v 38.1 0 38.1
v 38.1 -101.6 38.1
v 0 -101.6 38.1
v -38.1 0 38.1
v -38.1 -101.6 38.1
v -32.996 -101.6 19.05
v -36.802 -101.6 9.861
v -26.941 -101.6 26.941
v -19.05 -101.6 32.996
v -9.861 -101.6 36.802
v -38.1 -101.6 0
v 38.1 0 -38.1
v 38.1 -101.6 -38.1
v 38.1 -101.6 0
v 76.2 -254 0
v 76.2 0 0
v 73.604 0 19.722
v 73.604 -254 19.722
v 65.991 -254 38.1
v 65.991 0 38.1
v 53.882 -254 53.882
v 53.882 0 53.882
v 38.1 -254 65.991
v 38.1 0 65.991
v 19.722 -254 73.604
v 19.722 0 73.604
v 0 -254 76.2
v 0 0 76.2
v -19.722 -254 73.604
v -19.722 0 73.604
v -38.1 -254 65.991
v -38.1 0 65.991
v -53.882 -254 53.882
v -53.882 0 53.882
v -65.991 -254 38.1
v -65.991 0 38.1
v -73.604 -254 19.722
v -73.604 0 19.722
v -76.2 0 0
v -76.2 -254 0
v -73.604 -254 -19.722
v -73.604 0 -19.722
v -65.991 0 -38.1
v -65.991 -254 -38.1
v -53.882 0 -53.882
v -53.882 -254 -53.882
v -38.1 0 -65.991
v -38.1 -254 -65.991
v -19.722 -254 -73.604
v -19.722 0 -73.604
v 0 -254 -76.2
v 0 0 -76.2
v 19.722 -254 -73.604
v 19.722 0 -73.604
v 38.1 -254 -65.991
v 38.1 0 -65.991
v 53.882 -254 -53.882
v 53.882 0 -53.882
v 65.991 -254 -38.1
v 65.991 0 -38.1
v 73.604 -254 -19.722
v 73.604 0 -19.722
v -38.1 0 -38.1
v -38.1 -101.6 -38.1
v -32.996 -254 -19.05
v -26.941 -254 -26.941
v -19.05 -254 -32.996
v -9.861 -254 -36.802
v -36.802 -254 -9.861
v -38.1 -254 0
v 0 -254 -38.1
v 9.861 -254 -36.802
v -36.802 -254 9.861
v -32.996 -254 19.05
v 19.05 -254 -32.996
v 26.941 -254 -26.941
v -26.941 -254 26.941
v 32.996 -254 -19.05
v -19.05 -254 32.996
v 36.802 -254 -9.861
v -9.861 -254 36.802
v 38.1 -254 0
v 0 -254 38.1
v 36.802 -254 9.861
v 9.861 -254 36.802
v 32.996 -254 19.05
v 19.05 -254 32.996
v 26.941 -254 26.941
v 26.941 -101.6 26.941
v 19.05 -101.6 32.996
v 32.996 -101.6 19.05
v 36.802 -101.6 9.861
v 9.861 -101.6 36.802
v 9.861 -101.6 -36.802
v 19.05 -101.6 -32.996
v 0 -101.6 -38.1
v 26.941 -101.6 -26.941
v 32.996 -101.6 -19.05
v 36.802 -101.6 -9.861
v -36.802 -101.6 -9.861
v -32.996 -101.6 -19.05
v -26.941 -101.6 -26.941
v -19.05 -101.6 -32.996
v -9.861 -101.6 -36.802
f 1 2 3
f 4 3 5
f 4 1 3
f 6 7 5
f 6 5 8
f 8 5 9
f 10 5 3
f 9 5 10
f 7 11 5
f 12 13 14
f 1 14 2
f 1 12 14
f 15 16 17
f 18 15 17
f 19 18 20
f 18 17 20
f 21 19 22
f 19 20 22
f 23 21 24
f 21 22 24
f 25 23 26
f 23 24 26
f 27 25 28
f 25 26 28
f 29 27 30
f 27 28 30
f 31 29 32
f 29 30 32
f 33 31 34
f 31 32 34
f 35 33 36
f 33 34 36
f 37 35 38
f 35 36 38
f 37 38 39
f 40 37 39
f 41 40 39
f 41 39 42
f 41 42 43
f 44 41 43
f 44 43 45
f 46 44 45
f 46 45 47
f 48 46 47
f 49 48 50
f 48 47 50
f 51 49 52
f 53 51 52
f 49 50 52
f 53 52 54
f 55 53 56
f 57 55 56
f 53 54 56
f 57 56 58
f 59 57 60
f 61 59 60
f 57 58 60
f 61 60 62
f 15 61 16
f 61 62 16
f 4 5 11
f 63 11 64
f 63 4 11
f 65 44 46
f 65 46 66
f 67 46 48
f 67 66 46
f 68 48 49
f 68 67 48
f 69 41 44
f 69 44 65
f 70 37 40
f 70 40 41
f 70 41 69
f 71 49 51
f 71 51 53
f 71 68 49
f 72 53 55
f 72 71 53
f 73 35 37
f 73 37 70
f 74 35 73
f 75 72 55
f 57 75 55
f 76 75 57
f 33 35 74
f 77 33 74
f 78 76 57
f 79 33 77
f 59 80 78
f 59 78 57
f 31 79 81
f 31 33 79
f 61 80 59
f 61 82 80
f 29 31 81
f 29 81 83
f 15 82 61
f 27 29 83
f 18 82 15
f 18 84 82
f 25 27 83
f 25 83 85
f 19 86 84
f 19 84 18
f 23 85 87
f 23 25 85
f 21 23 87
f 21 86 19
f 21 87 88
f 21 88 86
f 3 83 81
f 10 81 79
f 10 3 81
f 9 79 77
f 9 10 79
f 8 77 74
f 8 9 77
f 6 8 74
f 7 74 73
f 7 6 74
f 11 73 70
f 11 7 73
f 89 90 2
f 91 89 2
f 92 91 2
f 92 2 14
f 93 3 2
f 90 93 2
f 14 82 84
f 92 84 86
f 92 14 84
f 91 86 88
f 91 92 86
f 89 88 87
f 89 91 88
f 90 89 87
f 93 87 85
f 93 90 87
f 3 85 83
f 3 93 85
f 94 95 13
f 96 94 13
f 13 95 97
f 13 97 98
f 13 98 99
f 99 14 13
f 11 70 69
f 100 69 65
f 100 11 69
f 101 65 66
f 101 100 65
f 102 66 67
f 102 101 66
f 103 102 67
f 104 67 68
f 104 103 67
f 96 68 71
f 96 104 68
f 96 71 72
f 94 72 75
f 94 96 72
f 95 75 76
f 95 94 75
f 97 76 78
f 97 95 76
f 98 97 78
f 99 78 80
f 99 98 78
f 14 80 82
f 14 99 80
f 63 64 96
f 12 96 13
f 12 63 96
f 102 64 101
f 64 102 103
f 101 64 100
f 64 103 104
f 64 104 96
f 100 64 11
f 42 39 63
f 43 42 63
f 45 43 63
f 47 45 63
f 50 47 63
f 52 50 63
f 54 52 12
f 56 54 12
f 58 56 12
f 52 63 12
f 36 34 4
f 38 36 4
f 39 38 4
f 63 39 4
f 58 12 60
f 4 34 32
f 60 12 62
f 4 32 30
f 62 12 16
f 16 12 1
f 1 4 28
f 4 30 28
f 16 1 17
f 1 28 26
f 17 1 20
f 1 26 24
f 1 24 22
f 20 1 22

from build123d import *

# Parameters (mm, degrees)
F0_R     = 76.2
F2_DEPTH = 254
F3_DEPTH = 254.001
F4_DEPTH = 101.6


with BuildPart() as f2:
    # F0 (on Front) → F2 (new body)
    with BuildSketch(Plane.XZ):
        Circle(F0_R)
    extrude(amount=F2_DEPTH)

    # F1 (on Front) → F3 (cut, through all)
    with BuildSketch(Plane.XZ):
        with BuildLine():
            ThreePointArc((38.1, 0), (26.940768, 26.940768), (0, 38.1))
            ThreePointArc((0, 38.1), (-26.940768, 26.940768), (-38.1, 0))
            ThreePointArc((-38.1, 0), (-26.940768, -26.940768), (0, -38.1))
            ThreePointArc((0, -38.1), (26.940768, -26.940768), (38.1, 0))
        make_face()
    extrude(amount=F3_DEPTH, mode=Mode.SUBTRACT)

    # F1 (on Front) → F4 (cut)
    with BuildSketch(Plane.XZ):
        with BuildLine():
            Line((38.1, 0), (38.1, 38.1))
            Line((38.1, 38.1), (0, 38.1))
            ThreePointArc((0, 38.1), (26.940768, 26.940768), (38.1, 0))
        make_face()
        with BuildLine():
            ThreePointArc((-38.1, 0), (-26.940768, 26.940768), (0, 38.1))
            Line((0, 38.1), (-38.1, 38.1))
            Line((-38.1, 38.1), (-38.1, 0))
        make_face()
        with BuildLine():
            Line((38.1, -38.1), (38.1, 0))
            ThreePointArc((38.1, 0), (26.940768, -26.940768), (0, -38.1))
            Line((0, -38.1), (38.1, -38.1))
        make_face()
        with BuildLine():
            ThreePointArc((0, -38.1), (-26.940768, -26.940768), (-38.1, 0))
            Line((-38.1, 0), (-38.1, -38.1))
            Line((-38.1, -38.1), (0, -38.1))
        make_face()
    extrude(amount=F4_DEPTH, mode=Mode.SUBTRACT)


solid = f2.part
